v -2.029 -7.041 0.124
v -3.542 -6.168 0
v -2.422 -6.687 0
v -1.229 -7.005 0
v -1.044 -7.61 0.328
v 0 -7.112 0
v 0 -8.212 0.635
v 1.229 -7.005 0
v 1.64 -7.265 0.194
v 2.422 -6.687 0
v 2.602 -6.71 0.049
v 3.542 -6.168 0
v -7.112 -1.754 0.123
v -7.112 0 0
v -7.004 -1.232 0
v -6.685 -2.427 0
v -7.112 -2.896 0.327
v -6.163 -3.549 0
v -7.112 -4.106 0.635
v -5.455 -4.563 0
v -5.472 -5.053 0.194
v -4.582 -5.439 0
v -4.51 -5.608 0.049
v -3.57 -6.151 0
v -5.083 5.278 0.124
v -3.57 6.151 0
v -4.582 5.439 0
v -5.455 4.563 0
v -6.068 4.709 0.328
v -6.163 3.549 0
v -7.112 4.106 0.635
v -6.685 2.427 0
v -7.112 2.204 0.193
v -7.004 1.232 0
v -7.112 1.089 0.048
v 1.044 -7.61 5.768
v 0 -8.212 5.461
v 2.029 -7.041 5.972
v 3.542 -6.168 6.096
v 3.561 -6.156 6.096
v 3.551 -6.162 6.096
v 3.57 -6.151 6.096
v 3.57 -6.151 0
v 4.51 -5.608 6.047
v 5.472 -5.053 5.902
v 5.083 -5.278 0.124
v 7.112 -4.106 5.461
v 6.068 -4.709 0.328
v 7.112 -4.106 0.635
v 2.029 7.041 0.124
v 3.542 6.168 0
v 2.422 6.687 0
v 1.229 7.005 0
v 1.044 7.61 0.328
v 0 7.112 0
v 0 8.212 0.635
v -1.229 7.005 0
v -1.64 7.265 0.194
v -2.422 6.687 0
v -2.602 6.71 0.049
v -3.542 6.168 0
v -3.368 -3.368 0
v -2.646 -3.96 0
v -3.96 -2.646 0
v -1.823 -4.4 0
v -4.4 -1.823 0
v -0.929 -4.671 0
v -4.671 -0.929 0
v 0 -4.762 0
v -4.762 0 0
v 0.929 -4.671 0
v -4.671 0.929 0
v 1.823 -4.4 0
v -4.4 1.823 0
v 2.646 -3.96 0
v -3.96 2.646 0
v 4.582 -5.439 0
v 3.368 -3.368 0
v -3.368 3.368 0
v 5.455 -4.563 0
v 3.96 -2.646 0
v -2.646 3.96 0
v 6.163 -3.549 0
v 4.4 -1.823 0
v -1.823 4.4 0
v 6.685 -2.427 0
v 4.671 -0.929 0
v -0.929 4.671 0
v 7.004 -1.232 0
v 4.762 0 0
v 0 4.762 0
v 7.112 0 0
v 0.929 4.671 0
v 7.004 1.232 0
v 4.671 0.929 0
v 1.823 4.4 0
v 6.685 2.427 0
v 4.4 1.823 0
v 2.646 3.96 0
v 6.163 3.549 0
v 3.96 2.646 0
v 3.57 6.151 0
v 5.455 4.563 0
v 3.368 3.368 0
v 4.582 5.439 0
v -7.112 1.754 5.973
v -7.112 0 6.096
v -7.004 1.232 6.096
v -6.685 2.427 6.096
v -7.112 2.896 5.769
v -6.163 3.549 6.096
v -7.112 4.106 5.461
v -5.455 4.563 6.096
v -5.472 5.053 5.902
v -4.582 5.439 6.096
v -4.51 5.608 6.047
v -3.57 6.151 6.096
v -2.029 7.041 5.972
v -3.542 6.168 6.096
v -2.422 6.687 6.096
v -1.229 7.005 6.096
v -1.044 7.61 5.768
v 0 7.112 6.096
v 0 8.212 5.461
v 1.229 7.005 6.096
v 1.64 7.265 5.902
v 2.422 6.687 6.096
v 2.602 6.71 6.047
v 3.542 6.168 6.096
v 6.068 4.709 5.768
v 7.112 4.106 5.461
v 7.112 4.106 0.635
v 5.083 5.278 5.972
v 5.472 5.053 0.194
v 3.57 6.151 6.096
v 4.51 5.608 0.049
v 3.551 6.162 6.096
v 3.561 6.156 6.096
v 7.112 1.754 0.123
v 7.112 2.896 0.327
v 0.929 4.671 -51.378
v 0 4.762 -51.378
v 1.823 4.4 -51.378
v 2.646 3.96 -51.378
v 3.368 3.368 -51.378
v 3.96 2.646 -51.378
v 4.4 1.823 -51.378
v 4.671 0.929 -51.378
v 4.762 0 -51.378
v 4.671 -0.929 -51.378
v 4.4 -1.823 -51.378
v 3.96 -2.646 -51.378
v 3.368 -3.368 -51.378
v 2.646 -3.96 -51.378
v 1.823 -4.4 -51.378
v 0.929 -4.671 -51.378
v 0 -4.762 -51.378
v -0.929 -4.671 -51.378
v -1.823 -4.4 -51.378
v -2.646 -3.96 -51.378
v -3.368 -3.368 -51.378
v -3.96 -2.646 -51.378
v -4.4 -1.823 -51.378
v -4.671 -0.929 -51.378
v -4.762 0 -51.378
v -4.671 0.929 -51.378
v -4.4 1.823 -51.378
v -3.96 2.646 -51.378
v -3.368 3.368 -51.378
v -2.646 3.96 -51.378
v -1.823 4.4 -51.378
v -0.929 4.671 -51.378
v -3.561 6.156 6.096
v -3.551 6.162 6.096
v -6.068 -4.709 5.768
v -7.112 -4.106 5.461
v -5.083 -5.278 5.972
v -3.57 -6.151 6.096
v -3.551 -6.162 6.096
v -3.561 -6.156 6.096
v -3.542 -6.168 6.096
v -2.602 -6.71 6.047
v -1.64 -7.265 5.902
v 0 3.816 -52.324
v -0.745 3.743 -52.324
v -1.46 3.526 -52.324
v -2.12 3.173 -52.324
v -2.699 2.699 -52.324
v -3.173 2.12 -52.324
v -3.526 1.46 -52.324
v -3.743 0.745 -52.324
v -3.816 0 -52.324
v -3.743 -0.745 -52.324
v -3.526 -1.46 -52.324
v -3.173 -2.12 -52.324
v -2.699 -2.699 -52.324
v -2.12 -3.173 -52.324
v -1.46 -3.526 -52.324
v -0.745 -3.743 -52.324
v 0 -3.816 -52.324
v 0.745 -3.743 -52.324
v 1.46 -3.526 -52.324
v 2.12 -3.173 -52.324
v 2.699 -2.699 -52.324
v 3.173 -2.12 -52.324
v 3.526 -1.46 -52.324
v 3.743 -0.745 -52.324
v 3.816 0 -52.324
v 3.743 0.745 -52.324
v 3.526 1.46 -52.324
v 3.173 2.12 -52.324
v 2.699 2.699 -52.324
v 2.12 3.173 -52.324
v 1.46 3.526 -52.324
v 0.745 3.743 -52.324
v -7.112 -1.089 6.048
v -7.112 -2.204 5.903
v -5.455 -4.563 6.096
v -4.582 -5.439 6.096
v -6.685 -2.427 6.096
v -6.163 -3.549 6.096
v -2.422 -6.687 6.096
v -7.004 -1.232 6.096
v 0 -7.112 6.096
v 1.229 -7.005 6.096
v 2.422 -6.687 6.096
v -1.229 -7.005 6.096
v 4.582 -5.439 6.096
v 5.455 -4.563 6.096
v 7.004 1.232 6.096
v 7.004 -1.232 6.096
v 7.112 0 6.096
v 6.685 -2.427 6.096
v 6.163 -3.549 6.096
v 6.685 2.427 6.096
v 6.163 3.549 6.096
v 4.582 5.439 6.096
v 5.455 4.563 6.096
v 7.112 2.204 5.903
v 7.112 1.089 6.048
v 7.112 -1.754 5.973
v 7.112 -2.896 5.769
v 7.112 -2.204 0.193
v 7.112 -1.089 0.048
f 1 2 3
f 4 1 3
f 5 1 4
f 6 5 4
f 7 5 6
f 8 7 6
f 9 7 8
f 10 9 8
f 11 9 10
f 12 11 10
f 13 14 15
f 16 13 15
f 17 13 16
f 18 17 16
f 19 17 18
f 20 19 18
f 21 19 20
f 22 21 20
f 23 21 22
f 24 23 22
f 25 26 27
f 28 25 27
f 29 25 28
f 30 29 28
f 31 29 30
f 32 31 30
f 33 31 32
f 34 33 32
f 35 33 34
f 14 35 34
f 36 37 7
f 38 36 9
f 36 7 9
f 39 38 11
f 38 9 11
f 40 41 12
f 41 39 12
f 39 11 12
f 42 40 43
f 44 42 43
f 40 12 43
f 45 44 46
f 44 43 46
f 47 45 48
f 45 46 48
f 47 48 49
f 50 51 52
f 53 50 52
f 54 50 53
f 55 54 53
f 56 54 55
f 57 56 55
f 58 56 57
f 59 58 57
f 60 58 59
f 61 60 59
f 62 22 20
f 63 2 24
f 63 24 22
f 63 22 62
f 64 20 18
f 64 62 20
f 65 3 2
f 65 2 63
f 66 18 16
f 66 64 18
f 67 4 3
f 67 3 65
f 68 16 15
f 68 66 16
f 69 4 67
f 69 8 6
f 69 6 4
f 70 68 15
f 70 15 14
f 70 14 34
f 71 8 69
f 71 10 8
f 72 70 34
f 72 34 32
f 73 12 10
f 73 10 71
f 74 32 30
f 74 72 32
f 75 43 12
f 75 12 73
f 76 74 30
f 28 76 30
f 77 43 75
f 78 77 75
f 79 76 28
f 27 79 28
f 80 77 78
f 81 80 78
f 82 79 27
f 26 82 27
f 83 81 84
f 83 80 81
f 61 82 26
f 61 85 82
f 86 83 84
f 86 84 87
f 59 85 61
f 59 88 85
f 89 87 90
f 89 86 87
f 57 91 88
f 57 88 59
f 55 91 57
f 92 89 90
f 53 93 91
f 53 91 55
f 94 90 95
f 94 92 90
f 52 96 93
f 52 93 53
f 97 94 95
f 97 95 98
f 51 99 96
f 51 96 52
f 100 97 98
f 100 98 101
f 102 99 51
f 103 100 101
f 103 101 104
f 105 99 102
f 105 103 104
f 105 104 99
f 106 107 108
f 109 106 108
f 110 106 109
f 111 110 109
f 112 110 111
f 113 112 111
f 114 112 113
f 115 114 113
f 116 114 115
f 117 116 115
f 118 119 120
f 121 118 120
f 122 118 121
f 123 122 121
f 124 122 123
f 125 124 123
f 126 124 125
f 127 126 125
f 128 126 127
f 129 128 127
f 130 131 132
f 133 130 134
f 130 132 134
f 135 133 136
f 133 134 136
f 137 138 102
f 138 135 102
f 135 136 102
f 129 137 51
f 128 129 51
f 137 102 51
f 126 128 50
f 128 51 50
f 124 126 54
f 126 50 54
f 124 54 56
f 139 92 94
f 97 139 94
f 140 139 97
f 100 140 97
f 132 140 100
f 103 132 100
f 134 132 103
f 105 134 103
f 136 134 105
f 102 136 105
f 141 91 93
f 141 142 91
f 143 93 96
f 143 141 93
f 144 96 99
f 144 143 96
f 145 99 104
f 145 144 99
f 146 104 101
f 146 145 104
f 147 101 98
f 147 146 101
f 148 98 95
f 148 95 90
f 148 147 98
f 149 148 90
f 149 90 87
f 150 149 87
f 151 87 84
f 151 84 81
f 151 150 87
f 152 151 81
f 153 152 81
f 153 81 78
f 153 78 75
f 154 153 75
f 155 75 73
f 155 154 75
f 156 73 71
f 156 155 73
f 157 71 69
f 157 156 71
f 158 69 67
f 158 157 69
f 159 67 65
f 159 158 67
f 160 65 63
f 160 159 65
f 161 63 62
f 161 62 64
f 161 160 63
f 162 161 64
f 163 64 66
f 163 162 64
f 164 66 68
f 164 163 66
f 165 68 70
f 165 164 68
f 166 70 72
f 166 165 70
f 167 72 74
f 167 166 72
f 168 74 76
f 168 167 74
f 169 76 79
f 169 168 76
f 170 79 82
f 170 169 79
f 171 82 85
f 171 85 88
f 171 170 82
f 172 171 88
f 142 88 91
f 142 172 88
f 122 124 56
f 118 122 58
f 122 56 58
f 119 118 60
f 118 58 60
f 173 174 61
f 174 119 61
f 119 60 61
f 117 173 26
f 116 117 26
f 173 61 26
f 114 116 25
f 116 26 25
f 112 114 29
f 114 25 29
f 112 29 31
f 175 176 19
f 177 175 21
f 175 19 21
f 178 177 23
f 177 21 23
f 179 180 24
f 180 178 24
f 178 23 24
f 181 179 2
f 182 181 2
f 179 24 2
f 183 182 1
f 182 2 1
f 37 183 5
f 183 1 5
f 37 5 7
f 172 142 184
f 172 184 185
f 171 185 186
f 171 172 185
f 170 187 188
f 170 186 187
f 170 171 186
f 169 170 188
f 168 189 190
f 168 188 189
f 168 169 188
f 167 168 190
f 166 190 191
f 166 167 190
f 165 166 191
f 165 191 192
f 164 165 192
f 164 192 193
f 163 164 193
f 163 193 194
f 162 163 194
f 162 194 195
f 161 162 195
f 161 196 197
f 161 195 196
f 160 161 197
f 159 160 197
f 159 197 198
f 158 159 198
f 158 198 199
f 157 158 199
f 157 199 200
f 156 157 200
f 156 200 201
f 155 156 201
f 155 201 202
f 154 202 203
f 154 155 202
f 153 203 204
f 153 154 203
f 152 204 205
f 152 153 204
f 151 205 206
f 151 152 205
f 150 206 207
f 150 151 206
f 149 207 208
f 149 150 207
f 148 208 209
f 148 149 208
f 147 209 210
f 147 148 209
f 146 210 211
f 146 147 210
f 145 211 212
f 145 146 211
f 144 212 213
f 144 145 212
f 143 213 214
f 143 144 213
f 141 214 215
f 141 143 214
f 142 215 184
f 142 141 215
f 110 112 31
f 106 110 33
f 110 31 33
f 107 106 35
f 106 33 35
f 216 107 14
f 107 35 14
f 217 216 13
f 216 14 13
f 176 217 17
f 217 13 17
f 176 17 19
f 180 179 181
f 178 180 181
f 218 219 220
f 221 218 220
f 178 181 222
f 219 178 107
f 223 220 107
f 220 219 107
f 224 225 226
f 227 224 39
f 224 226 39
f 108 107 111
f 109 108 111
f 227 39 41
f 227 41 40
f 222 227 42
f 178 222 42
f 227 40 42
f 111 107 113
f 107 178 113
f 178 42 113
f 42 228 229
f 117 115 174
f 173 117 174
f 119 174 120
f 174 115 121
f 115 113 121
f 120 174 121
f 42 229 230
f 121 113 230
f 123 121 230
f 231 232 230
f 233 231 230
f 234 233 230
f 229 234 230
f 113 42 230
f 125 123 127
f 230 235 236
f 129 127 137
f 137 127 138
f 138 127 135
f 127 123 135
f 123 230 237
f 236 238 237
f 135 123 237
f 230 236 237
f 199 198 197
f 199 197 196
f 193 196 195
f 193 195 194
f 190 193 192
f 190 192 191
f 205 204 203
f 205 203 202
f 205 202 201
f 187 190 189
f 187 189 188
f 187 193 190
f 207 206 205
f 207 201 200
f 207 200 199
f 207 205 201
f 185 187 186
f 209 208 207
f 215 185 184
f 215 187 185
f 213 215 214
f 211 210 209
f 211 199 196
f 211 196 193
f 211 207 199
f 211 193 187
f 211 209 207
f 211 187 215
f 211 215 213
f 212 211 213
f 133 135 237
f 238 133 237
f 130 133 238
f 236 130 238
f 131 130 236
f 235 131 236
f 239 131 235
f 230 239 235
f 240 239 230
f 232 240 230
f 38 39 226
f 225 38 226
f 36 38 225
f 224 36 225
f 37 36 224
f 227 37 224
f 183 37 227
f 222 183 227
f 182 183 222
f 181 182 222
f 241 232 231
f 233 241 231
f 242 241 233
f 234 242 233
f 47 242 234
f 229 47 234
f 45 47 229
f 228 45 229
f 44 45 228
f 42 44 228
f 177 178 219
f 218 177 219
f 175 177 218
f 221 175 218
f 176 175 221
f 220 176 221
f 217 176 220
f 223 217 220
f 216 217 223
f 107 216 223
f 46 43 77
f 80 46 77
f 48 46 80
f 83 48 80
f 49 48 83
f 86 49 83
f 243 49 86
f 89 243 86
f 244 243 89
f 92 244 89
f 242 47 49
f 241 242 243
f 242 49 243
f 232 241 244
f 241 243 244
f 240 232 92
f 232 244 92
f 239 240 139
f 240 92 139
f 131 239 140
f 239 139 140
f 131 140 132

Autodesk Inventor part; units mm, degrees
sketch "Sketch_2" plane through (0, 0, 0) normal (1, 0, 0) x (0, 1, 0)
  line L0 (0, -52.324) -> (0, 6.096)
  line L1 (0, 6.096) -> (7.112, 6.096)
  line L2 (7.112, 6.096) -> (8.5344, 5.2748)
  line L3 (8.5344, 5.2748) -> (8.5344, 0.8212)
  line L4 (8.5344, 0.8212) -> (7.112, 0)
  line L5 (7.112, 0) -> (4.7625, 0)
  line L6 (4.7625, 0) -> (4.7625, -51.3779)
  line L7 (4.7625, -51.3779) -> (3.8163, -52.324)
  line L8 (3.8163, -52.324) -> (0, -52.324)
  line L9 (0, -52.324) -> (0, 6.096)
revolve "Revolution1" add sketch "Sketch_2" angle 360 about axis through (0, 0, -52.324) along (0, 0, -1)
thread "Thread1" size "3/8-16 UNC" class "2A" standard "ANSI Unified Screw Threads" length 16.8338
sketch "Sketch_5" plane through (0, 0, 0) normal (0, 0, 1) x (1, 0, 0)
  circle A0 centre (0, 0) radius 12.7
  line L0 (-7.112, -4.1061) -> (0, -8.2122)
  line L1 (0, -8.2122) -> (7.112, -4.1061)
  line L2 (7.112, -4.1061) -> (7.112, 4.1061)
  line L3 (7.112, 4.1061) -> (0, 8.2122)
  line L4 (0, 8.2122) -> (-7.112, 4.1061)
  line L5 (-7.112, 4.1061) -> (-7.112, -4.1061)
extrude "Extrusion1" cut sketch "Sketch_5" along normal blind 25.4
ref_plane "axle_XY" through (0, 0, 0) normal (0, 0, -1) x (1, 0, 0)
ref_plane "axle_YZ" through (0, 0, 0) normal (1, 0, 0) x (0, -1, 0)
ref_plane "axle_ZX" through (0, 0, 0) normal (0, -1, 0) x (0, 0, -1)
properties part number "2.05456-A"
